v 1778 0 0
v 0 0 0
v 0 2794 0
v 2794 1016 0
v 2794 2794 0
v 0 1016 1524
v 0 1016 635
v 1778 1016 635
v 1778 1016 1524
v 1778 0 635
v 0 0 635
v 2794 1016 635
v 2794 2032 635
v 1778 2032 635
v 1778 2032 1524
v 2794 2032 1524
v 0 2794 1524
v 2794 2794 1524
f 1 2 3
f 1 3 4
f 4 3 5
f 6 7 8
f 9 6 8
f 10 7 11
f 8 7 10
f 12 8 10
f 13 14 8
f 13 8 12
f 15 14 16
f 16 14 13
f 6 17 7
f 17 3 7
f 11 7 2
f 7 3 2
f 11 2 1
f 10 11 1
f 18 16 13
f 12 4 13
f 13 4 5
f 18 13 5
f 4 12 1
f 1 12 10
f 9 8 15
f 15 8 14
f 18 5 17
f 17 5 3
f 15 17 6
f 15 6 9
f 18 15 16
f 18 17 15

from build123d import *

# Parameters (mm, degrees)
F0_W     = 2794
F0_H     = 2794
F1_DEPTH = 635
F3_DEPTH = 889
F5_DEPTH = 635


with BuildPart() as f1:
    # F0 (on Top) → F1 (new body)
    with BuildSketch(Plane.XY):
        with Locations((1397, 1397)):
            Rectangle(F0_W, F0_H)
    extrude(amount=F1_DEPTH)

    # F2 (on face) → F3 (join)
    with BuildSketch(Plane.XY.offset(635)):
        Polygon((2794, 2794), (0, 2794), (0, 1016), (1778, 1016), (1778, 2032), (2794, 2032), align=None)
    extrude(amount=F3_DEPTH)

    # F4 (on face) → F5 (cut)
    with BuildSketch(Plane.XY.offset(635)):
        Polygon((2794, 1016), (1778, 0), (2794, 0), align=None)
    extrude(amount=-F5_DEPTH, mode=Mode.SUBTRACT)


solid = f1.part
